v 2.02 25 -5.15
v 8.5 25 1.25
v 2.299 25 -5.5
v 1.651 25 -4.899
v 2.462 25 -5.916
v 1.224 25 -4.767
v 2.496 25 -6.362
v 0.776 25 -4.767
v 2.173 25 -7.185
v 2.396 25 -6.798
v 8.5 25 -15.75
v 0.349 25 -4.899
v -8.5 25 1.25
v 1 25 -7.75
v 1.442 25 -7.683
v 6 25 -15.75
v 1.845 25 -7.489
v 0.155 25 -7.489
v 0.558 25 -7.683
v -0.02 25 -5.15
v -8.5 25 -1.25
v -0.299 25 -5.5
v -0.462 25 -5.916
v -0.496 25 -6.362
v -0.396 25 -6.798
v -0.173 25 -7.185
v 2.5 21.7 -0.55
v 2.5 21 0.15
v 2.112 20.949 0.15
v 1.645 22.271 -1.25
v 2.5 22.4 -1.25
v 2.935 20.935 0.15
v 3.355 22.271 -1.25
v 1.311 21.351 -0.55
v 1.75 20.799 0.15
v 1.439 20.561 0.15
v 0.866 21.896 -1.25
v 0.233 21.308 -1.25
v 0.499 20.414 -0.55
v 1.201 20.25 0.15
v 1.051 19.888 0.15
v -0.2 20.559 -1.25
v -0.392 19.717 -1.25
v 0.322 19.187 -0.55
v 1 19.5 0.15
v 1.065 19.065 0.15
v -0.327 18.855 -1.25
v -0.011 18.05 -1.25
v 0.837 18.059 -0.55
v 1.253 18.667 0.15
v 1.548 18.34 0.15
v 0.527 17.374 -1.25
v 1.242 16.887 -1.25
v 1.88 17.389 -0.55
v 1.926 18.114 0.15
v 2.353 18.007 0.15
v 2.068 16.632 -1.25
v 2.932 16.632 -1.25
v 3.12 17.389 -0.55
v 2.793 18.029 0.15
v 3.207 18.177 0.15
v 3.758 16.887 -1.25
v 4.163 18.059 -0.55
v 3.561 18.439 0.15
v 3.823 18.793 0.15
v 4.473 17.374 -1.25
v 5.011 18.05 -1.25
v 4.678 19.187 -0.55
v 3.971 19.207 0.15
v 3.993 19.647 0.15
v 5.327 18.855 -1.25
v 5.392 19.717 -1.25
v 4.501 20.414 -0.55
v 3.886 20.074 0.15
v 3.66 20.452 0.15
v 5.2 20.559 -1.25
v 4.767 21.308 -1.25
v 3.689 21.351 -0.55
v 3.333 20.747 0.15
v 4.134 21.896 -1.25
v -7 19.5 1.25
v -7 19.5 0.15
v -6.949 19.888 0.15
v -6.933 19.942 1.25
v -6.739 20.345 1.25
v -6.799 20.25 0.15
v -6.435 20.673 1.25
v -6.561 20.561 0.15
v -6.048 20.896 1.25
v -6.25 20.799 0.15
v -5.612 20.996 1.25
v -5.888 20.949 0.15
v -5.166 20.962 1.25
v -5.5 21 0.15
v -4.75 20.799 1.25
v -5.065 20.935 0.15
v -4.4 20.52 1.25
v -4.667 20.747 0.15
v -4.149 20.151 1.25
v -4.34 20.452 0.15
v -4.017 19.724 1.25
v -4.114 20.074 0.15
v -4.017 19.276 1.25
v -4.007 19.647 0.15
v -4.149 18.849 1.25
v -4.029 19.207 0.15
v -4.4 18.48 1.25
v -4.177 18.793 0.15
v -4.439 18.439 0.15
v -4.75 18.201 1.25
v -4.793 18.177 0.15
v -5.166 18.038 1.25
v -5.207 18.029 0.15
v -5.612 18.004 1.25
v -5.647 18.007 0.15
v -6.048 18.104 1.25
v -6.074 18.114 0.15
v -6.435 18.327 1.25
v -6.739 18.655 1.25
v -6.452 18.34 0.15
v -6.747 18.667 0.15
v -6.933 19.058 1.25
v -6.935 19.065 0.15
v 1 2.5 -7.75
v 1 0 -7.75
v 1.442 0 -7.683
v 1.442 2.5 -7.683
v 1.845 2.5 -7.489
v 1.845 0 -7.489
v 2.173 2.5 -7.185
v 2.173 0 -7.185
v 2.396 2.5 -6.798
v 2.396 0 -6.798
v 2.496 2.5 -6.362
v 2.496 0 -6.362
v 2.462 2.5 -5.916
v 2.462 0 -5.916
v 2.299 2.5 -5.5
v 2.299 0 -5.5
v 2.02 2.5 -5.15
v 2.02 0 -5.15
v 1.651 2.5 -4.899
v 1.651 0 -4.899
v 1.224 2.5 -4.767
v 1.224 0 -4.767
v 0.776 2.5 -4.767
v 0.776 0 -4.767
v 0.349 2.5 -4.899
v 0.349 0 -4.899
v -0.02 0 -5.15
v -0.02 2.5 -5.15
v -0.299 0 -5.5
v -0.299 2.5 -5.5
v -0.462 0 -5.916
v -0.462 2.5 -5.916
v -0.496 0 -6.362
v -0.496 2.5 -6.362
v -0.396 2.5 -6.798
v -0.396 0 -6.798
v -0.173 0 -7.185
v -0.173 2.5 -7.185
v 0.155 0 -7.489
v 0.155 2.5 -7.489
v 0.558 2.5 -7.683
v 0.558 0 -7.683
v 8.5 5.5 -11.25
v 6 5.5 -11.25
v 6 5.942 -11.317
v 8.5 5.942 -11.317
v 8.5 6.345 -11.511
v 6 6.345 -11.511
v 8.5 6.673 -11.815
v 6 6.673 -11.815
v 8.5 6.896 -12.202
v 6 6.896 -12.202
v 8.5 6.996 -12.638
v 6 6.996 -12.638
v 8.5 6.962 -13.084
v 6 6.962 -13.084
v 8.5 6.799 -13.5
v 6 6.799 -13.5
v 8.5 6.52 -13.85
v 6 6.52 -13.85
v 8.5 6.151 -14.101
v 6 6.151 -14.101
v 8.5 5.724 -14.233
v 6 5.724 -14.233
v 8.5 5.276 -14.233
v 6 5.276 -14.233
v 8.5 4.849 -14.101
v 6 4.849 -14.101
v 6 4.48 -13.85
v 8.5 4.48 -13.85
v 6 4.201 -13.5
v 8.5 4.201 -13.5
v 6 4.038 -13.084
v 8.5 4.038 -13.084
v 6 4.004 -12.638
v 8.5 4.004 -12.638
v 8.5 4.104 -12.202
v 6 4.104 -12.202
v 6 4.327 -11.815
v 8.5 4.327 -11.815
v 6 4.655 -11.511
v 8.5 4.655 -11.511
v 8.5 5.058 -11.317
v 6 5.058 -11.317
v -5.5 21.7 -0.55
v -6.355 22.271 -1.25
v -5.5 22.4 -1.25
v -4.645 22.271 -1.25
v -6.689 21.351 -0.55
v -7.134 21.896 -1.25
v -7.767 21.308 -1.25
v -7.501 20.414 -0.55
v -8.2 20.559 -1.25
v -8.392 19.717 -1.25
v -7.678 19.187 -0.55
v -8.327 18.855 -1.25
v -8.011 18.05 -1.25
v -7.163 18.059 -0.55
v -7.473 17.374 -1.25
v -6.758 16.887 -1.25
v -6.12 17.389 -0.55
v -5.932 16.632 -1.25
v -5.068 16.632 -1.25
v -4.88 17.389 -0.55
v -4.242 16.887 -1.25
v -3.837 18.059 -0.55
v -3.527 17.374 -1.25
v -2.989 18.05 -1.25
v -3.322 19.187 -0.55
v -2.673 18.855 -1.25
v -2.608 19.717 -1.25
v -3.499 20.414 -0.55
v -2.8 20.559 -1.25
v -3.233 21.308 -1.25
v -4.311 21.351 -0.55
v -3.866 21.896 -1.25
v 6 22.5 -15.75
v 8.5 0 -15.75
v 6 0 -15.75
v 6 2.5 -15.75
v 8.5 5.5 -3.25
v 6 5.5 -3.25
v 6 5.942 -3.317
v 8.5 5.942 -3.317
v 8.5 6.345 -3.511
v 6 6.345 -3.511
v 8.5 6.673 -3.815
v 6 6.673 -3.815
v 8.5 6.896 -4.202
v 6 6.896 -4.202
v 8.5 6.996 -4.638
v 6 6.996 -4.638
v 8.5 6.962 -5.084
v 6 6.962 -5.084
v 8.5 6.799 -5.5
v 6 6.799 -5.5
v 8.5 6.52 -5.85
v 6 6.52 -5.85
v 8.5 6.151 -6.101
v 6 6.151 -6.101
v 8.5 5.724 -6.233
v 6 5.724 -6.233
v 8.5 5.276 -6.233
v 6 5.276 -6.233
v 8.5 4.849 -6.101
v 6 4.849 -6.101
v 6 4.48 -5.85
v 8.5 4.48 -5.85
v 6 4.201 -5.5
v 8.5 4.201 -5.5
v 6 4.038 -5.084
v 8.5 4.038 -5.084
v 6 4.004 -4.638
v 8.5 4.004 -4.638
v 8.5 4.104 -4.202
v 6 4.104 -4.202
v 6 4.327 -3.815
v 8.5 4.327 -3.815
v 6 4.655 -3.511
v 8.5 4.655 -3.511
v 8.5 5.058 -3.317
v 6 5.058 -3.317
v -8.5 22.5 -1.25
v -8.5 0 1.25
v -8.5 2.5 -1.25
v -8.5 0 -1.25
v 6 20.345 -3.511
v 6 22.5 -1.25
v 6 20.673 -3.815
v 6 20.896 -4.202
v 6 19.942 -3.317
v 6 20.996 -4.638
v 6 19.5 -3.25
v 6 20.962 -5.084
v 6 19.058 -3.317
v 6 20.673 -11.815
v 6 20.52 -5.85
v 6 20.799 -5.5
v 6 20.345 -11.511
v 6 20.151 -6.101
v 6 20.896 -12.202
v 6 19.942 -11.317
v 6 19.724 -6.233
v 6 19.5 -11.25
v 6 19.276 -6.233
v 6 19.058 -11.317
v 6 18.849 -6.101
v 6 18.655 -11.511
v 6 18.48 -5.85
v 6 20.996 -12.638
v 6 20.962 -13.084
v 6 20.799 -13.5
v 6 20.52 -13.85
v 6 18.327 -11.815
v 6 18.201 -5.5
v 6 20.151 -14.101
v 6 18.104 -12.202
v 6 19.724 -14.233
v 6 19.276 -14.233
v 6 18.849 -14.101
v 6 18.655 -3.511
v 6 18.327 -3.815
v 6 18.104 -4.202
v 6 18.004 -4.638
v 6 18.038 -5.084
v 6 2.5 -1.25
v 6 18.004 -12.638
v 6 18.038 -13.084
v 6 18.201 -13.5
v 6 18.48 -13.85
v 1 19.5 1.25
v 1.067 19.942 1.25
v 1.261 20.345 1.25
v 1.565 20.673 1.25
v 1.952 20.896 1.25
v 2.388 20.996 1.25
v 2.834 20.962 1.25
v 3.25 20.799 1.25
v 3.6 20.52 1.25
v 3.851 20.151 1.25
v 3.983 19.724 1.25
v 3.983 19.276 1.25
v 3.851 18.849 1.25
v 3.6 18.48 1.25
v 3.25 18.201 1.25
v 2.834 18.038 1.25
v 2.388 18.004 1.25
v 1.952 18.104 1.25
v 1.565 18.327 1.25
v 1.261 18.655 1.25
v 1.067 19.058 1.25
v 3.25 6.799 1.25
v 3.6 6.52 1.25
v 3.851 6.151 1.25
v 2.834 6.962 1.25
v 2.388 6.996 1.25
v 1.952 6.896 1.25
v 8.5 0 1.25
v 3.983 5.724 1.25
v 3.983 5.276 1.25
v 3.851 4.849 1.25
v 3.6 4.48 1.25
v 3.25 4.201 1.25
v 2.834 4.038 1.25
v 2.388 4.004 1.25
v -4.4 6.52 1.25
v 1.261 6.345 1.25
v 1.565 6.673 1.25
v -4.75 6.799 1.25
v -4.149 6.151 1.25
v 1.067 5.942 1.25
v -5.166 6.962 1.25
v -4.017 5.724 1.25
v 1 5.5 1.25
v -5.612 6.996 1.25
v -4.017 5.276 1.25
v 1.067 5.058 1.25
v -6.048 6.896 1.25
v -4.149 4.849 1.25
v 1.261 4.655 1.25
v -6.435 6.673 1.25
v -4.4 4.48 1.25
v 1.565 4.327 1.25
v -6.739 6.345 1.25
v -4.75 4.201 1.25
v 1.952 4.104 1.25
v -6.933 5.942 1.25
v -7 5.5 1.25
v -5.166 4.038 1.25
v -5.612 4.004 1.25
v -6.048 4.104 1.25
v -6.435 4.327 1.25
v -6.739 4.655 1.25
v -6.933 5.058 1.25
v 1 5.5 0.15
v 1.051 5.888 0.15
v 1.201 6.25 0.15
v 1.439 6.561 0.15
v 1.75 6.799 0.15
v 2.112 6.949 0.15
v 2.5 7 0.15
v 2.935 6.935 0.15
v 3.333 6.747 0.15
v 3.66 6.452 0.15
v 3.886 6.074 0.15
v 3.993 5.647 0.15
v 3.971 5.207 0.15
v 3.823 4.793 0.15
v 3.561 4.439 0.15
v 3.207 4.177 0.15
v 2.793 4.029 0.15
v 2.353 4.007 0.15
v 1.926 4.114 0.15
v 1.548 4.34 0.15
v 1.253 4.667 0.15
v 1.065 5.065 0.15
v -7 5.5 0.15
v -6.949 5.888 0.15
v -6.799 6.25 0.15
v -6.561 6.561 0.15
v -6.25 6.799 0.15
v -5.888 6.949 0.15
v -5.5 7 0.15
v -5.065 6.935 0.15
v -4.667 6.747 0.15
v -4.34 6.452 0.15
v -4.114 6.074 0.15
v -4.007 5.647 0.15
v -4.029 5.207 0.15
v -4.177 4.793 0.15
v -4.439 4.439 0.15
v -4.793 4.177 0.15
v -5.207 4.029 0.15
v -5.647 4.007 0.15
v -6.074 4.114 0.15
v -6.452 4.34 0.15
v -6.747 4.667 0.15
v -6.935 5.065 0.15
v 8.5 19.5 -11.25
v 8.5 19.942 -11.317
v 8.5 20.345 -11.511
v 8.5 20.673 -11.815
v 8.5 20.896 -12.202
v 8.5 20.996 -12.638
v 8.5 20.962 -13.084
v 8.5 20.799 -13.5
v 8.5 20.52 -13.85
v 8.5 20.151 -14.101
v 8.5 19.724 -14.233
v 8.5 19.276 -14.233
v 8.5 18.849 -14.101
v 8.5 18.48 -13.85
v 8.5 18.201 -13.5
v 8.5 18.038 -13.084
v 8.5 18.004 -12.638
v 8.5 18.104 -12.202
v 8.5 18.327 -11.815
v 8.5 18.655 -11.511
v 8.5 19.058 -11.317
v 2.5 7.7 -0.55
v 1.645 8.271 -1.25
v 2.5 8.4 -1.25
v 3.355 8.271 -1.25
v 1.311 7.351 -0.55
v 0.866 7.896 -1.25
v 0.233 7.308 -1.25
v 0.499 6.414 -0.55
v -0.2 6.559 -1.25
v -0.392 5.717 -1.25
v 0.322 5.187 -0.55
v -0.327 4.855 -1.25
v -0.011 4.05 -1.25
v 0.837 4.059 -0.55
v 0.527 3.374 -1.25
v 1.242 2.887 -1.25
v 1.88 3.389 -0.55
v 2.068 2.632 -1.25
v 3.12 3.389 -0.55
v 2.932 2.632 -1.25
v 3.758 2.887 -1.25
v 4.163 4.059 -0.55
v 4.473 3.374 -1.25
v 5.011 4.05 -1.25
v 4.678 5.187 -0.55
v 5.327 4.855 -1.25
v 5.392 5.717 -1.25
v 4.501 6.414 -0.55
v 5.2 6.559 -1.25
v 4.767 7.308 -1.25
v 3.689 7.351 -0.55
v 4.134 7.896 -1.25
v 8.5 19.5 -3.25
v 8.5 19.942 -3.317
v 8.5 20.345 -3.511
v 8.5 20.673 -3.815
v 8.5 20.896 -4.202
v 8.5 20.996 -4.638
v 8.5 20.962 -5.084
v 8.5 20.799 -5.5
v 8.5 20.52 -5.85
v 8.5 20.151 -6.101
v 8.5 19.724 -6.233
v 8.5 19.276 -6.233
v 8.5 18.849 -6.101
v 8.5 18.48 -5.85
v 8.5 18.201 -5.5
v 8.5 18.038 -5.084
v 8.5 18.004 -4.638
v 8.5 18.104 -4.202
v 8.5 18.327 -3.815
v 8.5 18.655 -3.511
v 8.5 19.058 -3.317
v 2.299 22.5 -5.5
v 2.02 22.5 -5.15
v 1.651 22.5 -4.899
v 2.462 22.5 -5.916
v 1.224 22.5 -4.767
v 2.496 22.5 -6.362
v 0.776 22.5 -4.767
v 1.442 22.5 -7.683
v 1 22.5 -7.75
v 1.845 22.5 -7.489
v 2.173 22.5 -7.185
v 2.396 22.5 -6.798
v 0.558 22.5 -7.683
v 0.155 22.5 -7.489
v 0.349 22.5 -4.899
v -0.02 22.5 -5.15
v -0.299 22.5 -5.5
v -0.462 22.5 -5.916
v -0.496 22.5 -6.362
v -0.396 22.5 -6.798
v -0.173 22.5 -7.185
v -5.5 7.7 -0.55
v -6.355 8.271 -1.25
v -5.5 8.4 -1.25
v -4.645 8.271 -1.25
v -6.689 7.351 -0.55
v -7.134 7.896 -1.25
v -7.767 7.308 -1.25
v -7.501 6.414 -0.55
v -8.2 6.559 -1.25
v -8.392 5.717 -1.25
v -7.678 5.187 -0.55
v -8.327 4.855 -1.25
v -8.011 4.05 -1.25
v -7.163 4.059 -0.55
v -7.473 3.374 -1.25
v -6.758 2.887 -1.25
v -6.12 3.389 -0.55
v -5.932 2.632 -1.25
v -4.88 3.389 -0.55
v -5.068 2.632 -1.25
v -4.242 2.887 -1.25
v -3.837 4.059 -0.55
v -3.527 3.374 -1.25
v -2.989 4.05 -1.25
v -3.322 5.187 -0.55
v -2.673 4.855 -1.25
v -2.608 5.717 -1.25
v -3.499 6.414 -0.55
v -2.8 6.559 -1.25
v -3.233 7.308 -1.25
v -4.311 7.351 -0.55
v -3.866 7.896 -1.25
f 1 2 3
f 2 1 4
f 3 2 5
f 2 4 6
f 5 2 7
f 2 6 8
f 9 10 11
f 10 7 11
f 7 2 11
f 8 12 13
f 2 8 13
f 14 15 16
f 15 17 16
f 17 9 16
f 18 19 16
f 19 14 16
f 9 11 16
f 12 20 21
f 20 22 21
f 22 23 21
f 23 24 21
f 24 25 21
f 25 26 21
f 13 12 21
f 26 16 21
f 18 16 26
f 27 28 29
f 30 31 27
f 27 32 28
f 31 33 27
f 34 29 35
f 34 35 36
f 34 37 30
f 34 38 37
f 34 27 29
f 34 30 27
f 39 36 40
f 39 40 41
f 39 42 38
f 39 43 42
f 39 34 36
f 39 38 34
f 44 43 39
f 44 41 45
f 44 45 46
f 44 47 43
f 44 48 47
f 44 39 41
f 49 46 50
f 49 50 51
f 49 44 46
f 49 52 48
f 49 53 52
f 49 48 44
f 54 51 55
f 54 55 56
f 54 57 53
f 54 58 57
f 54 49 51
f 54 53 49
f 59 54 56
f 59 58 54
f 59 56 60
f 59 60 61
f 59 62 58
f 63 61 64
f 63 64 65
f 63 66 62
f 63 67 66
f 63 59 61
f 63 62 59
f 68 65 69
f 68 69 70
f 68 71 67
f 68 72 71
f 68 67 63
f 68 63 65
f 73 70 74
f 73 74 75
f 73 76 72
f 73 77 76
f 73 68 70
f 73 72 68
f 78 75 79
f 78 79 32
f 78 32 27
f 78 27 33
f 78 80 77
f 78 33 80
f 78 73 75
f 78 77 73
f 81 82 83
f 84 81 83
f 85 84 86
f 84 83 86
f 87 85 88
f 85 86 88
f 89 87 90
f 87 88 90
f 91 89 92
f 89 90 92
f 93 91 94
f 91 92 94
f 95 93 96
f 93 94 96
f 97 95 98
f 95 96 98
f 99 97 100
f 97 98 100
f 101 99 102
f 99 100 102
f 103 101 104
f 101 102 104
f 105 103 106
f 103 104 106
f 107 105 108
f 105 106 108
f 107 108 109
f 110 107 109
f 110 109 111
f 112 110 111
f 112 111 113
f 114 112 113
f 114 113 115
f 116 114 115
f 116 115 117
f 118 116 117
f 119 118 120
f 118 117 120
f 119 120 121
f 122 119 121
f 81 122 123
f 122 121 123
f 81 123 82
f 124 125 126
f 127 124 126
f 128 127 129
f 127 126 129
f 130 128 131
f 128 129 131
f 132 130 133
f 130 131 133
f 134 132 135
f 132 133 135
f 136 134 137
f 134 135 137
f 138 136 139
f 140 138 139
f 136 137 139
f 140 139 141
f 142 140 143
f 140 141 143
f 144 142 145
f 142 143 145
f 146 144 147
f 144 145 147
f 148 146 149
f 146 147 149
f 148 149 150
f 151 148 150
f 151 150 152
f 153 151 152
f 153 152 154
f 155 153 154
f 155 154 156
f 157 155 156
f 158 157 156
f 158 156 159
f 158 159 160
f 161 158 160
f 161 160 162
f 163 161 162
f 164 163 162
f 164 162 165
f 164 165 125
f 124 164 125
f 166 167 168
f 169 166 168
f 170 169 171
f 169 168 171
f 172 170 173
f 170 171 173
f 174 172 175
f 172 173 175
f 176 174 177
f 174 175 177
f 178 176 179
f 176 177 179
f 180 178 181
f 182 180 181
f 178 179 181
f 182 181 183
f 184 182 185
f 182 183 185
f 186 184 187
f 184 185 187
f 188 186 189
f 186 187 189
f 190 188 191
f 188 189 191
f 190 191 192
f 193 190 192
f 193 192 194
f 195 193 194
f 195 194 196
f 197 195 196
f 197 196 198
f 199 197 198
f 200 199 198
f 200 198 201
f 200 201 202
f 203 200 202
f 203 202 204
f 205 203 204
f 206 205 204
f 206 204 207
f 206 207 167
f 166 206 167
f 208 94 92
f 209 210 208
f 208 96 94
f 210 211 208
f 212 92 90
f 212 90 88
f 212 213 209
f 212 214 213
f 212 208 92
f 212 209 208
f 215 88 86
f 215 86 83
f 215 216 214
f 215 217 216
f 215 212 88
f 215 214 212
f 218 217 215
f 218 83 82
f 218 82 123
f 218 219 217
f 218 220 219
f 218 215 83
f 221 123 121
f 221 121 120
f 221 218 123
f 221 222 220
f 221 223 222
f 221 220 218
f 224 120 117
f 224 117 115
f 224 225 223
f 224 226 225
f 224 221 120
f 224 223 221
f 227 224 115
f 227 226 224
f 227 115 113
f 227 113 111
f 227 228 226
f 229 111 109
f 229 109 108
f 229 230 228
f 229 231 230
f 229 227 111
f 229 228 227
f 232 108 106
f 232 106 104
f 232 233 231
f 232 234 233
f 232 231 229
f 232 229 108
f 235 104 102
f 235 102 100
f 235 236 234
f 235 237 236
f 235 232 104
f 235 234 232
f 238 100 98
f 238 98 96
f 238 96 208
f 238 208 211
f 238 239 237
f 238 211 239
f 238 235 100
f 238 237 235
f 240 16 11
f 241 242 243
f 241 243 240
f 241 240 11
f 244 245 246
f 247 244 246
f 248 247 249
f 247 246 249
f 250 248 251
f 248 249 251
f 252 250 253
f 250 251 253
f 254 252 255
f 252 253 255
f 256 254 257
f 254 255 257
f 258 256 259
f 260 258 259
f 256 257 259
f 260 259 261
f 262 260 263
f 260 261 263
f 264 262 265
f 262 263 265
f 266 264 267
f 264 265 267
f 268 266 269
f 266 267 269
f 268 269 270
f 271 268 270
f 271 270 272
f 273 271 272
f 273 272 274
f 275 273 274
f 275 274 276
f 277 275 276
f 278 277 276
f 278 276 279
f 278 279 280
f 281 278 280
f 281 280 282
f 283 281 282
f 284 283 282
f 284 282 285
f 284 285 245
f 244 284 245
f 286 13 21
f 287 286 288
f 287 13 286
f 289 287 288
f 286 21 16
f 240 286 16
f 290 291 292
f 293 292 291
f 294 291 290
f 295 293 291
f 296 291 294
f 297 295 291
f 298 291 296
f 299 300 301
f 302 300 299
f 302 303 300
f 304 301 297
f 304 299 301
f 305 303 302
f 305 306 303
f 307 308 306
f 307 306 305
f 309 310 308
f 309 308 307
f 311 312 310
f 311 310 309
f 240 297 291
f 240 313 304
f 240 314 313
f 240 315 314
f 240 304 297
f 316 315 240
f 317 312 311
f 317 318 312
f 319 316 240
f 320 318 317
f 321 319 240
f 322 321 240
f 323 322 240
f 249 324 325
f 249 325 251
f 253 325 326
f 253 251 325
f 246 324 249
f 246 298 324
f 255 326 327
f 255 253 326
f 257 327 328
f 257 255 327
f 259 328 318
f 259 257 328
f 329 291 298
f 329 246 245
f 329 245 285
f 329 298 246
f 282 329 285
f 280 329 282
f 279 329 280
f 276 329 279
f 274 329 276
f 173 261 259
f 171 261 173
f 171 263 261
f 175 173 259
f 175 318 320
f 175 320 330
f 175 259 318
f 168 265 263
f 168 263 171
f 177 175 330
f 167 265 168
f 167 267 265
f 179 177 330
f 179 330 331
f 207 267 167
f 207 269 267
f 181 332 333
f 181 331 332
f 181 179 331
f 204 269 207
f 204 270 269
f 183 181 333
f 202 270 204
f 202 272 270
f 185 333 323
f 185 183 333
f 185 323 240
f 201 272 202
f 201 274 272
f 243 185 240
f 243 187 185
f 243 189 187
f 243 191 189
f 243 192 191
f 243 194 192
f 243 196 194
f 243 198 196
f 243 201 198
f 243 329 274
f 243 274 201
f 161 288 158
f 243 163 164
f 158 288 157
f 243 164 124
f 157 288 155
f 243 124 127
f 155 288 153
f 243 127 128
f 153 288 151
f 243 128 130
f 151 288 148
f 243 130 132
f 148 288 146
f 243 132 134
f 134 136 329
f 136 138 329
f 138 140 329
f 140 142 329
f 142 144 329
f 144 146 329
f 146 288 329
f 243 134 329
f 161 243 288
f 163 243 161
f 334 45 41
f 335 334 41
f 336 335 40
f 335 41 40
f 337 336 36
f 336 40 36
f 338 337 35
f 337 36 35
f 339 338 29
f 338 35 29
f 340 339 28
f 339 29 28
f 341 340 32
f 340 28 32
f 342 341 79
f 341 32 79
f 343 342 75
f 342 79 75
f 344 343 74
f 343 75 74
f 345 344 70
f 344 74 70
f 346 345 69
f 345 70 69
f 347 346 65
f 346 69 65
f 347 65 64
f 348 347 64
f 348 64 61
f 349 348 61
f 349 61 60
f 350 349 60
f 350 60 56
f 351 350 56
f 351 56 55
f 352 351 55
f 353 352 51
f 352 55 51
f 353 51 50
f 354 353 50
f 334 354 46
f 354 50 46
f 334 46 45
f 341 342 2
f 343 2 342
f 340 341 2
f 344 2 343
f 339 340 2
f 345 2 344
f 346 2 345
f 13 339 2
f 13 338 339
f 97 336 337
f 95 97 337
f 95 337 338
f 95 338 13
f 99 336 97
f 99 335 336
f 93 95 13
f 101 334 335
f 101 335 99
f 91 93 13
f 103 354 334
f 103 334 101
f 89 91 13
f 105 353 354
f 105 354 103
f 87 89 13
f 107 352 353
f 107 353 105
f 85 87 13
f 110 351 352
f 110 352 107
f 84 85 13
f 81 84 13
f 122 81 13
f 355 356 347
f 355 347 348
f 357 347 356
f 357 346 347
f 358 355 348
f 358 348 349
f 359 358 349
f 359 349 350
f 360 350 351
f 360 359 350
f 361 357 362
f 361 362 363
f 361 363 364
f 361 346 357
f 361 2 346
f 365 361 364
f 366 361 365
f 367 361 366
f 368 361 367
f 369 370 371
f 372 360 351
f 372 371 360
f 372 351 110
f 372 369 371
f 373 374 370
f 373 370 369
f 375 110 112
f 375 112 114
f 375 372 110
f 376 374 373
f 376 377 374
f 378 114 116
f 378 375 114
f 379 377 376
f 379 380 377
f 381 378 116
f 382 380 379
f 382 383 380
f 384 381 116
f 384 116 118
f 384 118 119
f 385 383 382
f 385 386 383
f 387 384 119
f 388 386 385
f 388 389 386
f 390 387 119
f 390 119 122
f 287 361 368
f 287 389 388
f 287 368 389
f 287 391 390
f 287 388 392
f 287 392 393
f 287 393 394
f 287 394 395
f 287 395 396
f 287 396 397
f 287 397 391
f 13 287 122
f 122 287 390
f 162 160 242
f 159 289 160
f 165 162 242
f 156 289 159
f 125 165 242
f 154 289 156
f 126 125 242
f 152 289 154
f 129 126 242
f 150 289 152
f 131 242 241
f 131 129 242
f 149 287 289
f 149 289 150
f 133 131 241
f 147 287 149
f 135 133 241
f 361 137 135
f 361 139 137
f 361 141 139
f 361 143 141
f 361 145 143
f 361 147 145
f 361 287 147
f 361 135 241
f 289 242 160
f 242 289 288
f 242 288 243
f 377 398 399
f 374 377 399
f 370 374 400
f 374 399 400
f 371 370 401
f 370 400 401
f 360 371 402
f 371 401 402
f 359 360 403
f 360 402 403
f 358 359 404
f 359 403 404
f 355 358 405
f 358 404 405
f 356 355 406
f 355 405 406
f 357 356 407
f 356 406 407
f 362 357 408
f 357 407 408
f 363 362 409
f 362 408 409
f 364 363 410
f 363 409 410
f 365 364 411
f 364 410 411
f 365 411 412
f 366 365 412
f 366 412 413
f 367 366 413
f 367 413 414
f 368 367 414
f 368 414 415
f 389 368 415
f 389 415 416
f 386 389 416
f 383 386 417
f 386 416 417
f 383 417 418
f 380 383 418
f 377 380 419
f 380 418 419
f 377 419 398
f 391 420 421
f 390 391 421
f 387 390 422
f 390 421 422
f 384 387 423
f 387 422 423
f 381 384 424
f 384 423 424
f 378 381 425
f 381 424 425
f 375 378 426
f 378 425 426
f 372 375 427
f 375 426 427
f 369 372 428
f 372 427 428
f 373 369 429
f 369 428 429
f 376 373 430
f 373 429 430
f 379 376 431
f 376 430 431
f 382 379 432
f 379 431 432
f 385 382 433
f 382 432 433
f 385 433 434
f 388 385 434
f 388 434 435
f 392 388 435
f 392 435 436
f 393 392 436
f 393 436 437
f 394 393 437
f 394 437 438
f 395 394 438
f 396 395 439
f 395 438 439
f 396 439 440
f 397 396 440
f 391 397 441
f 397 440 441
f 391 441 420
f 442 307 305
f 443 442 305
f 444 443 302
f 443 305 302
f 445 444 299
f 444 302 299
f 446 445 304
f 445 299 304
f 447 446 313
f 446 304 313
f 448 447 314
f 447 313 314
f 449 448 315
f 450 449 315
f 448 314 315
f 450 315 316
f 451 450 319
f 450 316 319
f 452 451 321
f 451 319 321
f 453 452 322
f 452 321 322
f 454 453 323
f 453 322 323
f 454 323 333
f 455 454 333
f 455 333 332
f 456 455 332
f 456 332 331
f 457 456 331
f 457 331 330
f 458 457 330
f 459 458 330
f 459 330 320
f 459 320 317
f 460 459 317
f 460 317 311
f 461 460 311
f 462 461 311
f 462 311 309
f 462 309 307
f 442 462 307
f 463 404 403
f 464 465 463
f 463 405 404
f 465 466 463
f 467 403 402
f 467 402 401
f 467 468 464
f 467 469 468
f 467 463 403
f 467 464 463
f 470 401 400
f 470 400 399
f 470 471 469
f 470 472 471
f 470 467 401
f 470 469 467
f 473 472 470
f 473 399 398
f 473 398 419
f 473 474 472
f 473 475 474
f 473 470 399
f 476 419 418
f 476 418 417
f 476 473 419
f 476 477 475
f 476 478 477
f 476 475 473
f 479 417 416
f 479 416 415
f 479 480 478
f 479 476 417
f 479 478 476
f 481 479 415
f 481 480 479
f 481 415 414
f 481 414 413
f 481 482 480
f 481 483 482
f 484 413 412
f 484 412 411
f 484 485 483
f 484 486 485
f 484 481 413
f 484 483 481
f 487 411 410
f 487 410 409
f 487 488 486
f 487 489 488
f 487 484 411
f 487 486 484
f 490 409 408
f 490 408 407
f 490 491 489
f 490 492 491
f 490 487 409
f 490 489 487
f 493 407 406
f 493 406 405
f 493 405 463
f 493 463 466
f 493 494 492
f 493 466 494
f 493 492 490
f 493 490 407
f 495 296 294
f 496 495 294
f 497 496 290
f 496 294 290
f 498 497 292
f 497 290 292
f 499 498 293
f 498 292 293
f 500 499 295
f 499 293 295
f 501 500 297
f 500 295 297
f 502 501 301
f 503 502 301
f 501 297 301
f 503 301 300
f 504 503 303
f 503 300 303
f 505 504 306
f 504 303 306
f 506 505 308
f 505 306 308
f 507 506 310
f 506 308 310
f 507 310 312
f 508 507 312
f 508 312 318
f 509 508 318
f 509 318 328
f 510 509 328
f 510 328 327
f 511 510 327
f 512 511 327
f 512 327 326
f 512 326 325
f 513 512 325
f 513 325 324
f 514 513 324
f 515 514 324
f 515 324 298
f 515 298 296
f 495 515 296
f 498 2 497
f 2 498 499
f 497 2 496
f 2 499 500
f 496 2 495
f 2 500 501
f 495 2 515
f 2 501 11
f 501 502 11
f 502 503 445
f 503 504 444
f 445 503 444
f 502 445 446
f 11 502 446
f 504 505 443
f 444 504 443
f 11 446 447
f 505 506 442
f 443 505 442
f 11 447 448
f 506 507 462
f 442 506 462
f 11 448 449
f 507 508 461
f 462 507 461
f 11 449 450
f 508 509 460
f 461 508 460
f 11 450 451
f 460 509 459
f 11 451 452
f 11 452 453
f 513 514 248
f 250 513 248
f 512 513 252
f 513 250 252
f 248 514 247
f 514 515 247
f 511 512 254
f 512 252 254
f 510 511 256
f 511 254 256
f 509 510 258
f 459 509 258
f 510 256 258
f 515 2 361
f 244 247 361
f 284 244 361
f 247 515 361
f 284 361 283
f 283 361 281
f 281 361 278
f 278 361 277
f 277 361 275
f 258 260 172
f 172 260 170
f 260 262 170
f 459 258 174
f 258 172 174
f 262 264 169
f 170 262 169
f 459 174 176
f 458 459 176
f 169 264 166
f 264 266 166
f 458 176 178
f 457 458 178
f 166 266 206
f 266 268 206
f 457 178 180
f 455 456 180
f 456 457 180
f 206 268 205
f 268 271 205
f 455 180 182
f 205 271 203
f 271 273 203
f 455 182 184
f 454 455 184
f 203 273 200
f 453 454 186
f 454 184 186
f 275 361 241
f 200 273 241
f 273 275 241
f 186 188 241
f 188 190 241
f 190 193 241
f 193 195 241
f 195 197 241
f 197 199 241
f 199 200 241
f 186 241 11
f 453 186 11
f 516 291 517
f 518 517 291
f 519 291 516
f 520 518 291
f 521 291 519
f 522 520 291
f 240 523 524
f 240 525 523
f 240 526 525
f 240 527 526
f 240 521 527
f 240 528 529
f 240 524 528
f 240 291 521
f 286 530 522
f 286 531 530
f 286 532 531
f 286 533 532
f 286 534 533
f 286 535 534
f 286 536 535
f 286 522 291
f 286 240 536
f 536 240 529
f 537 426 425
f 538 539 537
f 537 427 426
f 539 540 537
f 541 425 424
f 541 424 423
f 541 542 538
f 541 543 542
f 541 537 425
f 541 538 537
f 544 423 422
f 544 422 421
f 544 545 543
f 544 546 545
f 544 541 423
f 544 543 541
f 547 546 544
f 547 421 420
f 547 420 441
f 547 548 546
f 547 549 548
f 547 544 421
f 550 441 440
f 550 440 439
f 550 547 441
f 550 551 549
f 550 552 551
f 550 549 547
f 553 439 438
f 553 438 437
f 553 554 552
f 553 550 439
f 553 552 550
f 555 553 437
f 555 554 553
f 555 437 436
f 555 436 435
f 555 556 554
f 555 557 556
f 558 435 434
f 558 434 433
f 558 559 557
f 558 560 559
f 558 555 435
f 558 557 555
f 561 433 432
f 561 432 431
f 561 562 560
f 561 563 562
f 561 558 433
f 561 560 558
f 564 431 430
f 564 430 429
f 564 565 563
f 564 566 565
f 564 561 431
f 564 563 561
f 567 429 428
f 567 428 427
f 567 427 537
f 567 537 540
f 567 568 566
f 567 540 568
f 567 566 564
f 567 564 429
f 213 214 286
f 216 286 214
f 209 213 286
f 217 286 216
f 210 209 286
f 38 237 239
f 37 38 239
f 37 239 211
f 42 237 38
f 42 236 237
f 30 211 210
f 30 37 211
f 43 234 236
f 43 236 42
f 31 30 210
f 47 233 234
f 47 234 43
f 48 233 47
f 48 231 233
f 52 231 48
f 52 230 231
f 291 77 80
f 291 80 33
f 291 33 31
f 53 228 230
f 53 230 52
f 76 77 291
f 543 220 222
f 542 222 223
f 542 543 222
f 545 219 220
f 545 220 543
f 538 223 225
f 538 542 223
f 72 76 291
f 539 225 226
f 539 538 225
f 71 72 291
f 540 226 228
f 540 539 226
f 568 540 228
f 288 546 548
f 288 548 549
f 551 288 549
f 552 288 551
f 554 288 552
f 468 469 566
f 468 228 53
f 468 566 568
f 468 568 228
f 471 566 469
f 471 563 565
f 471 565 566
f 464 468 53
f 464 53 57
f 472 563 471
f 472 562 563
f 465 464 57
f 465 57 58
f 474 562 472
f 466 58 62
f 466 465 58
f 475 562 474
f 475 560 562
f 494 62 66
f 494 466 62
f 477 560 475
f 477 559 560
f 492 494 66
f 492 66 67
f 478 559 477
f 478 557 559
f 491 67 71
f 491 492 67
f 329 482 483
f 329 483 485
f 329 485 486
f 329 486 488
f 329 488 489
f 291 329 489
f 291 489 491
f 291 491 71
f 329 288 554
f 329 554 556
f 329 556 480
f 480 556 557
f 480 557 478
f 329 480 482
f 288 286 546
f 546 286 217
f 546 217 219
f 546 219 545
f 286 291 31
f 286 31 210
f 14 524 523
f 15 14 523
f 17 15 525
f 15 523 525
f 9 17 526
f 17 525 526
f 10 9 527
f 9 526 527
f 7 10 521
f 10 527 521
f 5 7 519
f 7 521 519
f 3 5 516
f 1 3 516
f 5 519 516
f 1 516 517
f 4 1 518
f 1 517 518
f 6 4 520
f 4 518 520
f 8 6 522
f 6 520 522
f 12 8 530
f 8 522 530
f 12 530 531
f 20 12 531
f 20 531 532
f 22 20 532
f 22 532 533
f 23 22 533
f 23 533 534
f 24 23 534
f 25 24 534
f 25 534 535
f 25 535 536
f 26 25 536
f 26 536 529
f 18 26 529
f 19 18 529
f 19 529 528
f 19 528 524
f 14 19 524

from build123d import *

# Parameters (mm, degrees)
EXTRUDE_1_DEPTH          = 25
EXTRUDE_3_DEPTH          = 2.5
EXTRUDE_4_DEPTH          = 2.5
SKETCH_8_R               = 1.5
CUT_EXTRUDE_1_DEPTH      = 31.124740663
SKETCH_9_R               = 1.5
CUT_EXTRUDE_2_DEPTH      = 33.913712948
SKETCH_10_R              = 1.5
CUT_EXTRUDE_3_DEPTH      = 31.745934691
HOLE_WIZARD_2_AT_2_COUNT = 2
HOLE_WIZARD_2_AT_2_PITCH = 8
HOLE_WIZARD_2_AT_3_COUNT = 2
HOLE_WIZARD_2_AT_3_PITCH = 16.124515497
HOLE_WIZARD_2_AT_4_COUNT = 2
HOLE_WIZARD_2_AT_4_PITCH = 14


with BuildPart() as part:
    # 草图1 → 凸台-拉伸1 (new body)
    with BuildSketch(Plane(origin=(0, 0, 0), x_dir=(1, 0, 0), z_dir=(0, 1, 0))):
        Polygon((6, 1.25), (6, 15.75), (8.5, 15.75), (8.5, 1.25), (8.5, -1.25), (-8.5, -1.25), (-8.5, 1.25), align=None)
    extrude(amount=EXTRUDE_1_DEPTH)

    # 草图5 → 凸台-拉伸3 (add)
    with BuildSketch(Plane.XZ):
        Polygon((6, -15.75), (6, -1.25), (-8.5, -1.25), align=None)
    extrude(amount=-EXTRUDE_3_DEPTH)

    # 草图6 → 凸台-拉伸4 (add)
    with BuildSketch(Plane(origin=(0, 25, 0), x_dir=(1, 0, 0), z_dir=(0, 1, 0))):
        Polygon((6, 15.75), (6, 1.25), (-8.5, 1.25), align=None)
    extrude(amount=-EXTRUDE_4_DEPTH)

    # 草图8 → 切除-拉伸1 (cut, through all)
    with BuildSketch(Plane(origin=(0, 0, -1.25), x_dir=(-1, 0, 0), z_dir=(0, 0, -1))):
        with Locations((-2.5, 19.5)):
            Circle(SKETCH_8_R)
        with Locations((5.5, 19.5)):
            Circle(SKETCH_8_R)
        with Locations((5.5, 5.5)):
            Circle(SKETCH_8_R)
        with Locations((-2.5, 5.5)):
            Circle(SKETCH_8_R)
    extrude(amount=-CUT_EXTRUDE_1_DEPTH, mode=Mode.SUBTRACT)

    # 草图9 → 切除-拉伸2 (cut, through all)
    with BuildSketch(Plane.ZY.offset(-6)):
        with Locations((-12.75, 19.5)):
            Circle(SKETCH_9_R)
        with Locations((-12.75, 5.5)):
            Circle(SKETCH_9_R)
        with Locations((-4.75, 19.5)):
            Circle(SKETCH_9_R)
        with Locations((-4.75, 5.5)):
            Circle(SKETCH_9_R)
    extrude(amount=-CUT_EXTRUDE_2_DEPTH, mode=Mode.SUBTRACT)

    # 草图10 → 切除-拉伸3 (cut, through all)
    with BuildSketch(Plane.XZ):
        with Locations(Location((1, -6.25, 0), (0, 0, 270))):
            Circle(SKETCH_10_R)
    extrude(amount=-CUT_EXTRUDE_3_DEPTH, mode=Mode.SUBTRACT)

    # 草图14 → 打孔尺寸(%根据十字)槽沉头木螺钉的类型2 (revolve, cut)
    with BuildSketch(Plane(origin=(-5.5, 5.5, -1.25), x_dir=(0, 1, 0), z_dir=(1, 0, 0))):
        Polygon((0, 0), (0, 2.5), (1.5, 2.5), (1.5, 1.4), (2.9, 0), align=None)
    hole_wizard_2 = revolve(axis=Axis((-5.5, 5.5, -7.6), (0, 0, 1)), mode=Mode.SUBTRACT)

    # 打孔尺寸(%根据十字)槽沉头木螺钉的类型2 at 2: 打孔尺寸(%根据十字)槽沉头木螺钉的类型2 ×2
    with Locations(*[(i * HOLE_WIZARD_2_AT_2_PITCH, 0, 0) for i in range(1, HOLE_WIZARD_2_AT_2_COUNT)]):
        add(hole_wizard_2, mode=Mode.SUBTRACT)

    # 打孔尺寸(%根据十字)槽沉头木螺钉的类型2 at 3: 打孔尺寸(%根据十字)槽沉头木螺钉的类型2 ×2
    with Locations(*[Vector(0.49613893835683387, 0.8682431421244591, 0) * (i * HOLE_WIZARD_2_AT_3_PITCH) for i in range(1, HOLE_WIZARD_2_AT_3_COUNT)]):
        add(hole_wizard_2, mode=Mode.SUBTRACT)

    # 打孔尺寸(%根据十字)槽沉头木螺钉的类型2 at 4: 打孔尺寸(%根据十字)槽沉头木螺钉的类型2 ×2
    with Locations(*[(0, i * HOLE_WIZARD_2_AT_4_PITCH, 0) for i in range(1, HOLE_WIZARD_2_AT_4_COUNT)]):
        add(hole_wizard_2, mode=Mode.SUBTRACT)


solid = part.part
